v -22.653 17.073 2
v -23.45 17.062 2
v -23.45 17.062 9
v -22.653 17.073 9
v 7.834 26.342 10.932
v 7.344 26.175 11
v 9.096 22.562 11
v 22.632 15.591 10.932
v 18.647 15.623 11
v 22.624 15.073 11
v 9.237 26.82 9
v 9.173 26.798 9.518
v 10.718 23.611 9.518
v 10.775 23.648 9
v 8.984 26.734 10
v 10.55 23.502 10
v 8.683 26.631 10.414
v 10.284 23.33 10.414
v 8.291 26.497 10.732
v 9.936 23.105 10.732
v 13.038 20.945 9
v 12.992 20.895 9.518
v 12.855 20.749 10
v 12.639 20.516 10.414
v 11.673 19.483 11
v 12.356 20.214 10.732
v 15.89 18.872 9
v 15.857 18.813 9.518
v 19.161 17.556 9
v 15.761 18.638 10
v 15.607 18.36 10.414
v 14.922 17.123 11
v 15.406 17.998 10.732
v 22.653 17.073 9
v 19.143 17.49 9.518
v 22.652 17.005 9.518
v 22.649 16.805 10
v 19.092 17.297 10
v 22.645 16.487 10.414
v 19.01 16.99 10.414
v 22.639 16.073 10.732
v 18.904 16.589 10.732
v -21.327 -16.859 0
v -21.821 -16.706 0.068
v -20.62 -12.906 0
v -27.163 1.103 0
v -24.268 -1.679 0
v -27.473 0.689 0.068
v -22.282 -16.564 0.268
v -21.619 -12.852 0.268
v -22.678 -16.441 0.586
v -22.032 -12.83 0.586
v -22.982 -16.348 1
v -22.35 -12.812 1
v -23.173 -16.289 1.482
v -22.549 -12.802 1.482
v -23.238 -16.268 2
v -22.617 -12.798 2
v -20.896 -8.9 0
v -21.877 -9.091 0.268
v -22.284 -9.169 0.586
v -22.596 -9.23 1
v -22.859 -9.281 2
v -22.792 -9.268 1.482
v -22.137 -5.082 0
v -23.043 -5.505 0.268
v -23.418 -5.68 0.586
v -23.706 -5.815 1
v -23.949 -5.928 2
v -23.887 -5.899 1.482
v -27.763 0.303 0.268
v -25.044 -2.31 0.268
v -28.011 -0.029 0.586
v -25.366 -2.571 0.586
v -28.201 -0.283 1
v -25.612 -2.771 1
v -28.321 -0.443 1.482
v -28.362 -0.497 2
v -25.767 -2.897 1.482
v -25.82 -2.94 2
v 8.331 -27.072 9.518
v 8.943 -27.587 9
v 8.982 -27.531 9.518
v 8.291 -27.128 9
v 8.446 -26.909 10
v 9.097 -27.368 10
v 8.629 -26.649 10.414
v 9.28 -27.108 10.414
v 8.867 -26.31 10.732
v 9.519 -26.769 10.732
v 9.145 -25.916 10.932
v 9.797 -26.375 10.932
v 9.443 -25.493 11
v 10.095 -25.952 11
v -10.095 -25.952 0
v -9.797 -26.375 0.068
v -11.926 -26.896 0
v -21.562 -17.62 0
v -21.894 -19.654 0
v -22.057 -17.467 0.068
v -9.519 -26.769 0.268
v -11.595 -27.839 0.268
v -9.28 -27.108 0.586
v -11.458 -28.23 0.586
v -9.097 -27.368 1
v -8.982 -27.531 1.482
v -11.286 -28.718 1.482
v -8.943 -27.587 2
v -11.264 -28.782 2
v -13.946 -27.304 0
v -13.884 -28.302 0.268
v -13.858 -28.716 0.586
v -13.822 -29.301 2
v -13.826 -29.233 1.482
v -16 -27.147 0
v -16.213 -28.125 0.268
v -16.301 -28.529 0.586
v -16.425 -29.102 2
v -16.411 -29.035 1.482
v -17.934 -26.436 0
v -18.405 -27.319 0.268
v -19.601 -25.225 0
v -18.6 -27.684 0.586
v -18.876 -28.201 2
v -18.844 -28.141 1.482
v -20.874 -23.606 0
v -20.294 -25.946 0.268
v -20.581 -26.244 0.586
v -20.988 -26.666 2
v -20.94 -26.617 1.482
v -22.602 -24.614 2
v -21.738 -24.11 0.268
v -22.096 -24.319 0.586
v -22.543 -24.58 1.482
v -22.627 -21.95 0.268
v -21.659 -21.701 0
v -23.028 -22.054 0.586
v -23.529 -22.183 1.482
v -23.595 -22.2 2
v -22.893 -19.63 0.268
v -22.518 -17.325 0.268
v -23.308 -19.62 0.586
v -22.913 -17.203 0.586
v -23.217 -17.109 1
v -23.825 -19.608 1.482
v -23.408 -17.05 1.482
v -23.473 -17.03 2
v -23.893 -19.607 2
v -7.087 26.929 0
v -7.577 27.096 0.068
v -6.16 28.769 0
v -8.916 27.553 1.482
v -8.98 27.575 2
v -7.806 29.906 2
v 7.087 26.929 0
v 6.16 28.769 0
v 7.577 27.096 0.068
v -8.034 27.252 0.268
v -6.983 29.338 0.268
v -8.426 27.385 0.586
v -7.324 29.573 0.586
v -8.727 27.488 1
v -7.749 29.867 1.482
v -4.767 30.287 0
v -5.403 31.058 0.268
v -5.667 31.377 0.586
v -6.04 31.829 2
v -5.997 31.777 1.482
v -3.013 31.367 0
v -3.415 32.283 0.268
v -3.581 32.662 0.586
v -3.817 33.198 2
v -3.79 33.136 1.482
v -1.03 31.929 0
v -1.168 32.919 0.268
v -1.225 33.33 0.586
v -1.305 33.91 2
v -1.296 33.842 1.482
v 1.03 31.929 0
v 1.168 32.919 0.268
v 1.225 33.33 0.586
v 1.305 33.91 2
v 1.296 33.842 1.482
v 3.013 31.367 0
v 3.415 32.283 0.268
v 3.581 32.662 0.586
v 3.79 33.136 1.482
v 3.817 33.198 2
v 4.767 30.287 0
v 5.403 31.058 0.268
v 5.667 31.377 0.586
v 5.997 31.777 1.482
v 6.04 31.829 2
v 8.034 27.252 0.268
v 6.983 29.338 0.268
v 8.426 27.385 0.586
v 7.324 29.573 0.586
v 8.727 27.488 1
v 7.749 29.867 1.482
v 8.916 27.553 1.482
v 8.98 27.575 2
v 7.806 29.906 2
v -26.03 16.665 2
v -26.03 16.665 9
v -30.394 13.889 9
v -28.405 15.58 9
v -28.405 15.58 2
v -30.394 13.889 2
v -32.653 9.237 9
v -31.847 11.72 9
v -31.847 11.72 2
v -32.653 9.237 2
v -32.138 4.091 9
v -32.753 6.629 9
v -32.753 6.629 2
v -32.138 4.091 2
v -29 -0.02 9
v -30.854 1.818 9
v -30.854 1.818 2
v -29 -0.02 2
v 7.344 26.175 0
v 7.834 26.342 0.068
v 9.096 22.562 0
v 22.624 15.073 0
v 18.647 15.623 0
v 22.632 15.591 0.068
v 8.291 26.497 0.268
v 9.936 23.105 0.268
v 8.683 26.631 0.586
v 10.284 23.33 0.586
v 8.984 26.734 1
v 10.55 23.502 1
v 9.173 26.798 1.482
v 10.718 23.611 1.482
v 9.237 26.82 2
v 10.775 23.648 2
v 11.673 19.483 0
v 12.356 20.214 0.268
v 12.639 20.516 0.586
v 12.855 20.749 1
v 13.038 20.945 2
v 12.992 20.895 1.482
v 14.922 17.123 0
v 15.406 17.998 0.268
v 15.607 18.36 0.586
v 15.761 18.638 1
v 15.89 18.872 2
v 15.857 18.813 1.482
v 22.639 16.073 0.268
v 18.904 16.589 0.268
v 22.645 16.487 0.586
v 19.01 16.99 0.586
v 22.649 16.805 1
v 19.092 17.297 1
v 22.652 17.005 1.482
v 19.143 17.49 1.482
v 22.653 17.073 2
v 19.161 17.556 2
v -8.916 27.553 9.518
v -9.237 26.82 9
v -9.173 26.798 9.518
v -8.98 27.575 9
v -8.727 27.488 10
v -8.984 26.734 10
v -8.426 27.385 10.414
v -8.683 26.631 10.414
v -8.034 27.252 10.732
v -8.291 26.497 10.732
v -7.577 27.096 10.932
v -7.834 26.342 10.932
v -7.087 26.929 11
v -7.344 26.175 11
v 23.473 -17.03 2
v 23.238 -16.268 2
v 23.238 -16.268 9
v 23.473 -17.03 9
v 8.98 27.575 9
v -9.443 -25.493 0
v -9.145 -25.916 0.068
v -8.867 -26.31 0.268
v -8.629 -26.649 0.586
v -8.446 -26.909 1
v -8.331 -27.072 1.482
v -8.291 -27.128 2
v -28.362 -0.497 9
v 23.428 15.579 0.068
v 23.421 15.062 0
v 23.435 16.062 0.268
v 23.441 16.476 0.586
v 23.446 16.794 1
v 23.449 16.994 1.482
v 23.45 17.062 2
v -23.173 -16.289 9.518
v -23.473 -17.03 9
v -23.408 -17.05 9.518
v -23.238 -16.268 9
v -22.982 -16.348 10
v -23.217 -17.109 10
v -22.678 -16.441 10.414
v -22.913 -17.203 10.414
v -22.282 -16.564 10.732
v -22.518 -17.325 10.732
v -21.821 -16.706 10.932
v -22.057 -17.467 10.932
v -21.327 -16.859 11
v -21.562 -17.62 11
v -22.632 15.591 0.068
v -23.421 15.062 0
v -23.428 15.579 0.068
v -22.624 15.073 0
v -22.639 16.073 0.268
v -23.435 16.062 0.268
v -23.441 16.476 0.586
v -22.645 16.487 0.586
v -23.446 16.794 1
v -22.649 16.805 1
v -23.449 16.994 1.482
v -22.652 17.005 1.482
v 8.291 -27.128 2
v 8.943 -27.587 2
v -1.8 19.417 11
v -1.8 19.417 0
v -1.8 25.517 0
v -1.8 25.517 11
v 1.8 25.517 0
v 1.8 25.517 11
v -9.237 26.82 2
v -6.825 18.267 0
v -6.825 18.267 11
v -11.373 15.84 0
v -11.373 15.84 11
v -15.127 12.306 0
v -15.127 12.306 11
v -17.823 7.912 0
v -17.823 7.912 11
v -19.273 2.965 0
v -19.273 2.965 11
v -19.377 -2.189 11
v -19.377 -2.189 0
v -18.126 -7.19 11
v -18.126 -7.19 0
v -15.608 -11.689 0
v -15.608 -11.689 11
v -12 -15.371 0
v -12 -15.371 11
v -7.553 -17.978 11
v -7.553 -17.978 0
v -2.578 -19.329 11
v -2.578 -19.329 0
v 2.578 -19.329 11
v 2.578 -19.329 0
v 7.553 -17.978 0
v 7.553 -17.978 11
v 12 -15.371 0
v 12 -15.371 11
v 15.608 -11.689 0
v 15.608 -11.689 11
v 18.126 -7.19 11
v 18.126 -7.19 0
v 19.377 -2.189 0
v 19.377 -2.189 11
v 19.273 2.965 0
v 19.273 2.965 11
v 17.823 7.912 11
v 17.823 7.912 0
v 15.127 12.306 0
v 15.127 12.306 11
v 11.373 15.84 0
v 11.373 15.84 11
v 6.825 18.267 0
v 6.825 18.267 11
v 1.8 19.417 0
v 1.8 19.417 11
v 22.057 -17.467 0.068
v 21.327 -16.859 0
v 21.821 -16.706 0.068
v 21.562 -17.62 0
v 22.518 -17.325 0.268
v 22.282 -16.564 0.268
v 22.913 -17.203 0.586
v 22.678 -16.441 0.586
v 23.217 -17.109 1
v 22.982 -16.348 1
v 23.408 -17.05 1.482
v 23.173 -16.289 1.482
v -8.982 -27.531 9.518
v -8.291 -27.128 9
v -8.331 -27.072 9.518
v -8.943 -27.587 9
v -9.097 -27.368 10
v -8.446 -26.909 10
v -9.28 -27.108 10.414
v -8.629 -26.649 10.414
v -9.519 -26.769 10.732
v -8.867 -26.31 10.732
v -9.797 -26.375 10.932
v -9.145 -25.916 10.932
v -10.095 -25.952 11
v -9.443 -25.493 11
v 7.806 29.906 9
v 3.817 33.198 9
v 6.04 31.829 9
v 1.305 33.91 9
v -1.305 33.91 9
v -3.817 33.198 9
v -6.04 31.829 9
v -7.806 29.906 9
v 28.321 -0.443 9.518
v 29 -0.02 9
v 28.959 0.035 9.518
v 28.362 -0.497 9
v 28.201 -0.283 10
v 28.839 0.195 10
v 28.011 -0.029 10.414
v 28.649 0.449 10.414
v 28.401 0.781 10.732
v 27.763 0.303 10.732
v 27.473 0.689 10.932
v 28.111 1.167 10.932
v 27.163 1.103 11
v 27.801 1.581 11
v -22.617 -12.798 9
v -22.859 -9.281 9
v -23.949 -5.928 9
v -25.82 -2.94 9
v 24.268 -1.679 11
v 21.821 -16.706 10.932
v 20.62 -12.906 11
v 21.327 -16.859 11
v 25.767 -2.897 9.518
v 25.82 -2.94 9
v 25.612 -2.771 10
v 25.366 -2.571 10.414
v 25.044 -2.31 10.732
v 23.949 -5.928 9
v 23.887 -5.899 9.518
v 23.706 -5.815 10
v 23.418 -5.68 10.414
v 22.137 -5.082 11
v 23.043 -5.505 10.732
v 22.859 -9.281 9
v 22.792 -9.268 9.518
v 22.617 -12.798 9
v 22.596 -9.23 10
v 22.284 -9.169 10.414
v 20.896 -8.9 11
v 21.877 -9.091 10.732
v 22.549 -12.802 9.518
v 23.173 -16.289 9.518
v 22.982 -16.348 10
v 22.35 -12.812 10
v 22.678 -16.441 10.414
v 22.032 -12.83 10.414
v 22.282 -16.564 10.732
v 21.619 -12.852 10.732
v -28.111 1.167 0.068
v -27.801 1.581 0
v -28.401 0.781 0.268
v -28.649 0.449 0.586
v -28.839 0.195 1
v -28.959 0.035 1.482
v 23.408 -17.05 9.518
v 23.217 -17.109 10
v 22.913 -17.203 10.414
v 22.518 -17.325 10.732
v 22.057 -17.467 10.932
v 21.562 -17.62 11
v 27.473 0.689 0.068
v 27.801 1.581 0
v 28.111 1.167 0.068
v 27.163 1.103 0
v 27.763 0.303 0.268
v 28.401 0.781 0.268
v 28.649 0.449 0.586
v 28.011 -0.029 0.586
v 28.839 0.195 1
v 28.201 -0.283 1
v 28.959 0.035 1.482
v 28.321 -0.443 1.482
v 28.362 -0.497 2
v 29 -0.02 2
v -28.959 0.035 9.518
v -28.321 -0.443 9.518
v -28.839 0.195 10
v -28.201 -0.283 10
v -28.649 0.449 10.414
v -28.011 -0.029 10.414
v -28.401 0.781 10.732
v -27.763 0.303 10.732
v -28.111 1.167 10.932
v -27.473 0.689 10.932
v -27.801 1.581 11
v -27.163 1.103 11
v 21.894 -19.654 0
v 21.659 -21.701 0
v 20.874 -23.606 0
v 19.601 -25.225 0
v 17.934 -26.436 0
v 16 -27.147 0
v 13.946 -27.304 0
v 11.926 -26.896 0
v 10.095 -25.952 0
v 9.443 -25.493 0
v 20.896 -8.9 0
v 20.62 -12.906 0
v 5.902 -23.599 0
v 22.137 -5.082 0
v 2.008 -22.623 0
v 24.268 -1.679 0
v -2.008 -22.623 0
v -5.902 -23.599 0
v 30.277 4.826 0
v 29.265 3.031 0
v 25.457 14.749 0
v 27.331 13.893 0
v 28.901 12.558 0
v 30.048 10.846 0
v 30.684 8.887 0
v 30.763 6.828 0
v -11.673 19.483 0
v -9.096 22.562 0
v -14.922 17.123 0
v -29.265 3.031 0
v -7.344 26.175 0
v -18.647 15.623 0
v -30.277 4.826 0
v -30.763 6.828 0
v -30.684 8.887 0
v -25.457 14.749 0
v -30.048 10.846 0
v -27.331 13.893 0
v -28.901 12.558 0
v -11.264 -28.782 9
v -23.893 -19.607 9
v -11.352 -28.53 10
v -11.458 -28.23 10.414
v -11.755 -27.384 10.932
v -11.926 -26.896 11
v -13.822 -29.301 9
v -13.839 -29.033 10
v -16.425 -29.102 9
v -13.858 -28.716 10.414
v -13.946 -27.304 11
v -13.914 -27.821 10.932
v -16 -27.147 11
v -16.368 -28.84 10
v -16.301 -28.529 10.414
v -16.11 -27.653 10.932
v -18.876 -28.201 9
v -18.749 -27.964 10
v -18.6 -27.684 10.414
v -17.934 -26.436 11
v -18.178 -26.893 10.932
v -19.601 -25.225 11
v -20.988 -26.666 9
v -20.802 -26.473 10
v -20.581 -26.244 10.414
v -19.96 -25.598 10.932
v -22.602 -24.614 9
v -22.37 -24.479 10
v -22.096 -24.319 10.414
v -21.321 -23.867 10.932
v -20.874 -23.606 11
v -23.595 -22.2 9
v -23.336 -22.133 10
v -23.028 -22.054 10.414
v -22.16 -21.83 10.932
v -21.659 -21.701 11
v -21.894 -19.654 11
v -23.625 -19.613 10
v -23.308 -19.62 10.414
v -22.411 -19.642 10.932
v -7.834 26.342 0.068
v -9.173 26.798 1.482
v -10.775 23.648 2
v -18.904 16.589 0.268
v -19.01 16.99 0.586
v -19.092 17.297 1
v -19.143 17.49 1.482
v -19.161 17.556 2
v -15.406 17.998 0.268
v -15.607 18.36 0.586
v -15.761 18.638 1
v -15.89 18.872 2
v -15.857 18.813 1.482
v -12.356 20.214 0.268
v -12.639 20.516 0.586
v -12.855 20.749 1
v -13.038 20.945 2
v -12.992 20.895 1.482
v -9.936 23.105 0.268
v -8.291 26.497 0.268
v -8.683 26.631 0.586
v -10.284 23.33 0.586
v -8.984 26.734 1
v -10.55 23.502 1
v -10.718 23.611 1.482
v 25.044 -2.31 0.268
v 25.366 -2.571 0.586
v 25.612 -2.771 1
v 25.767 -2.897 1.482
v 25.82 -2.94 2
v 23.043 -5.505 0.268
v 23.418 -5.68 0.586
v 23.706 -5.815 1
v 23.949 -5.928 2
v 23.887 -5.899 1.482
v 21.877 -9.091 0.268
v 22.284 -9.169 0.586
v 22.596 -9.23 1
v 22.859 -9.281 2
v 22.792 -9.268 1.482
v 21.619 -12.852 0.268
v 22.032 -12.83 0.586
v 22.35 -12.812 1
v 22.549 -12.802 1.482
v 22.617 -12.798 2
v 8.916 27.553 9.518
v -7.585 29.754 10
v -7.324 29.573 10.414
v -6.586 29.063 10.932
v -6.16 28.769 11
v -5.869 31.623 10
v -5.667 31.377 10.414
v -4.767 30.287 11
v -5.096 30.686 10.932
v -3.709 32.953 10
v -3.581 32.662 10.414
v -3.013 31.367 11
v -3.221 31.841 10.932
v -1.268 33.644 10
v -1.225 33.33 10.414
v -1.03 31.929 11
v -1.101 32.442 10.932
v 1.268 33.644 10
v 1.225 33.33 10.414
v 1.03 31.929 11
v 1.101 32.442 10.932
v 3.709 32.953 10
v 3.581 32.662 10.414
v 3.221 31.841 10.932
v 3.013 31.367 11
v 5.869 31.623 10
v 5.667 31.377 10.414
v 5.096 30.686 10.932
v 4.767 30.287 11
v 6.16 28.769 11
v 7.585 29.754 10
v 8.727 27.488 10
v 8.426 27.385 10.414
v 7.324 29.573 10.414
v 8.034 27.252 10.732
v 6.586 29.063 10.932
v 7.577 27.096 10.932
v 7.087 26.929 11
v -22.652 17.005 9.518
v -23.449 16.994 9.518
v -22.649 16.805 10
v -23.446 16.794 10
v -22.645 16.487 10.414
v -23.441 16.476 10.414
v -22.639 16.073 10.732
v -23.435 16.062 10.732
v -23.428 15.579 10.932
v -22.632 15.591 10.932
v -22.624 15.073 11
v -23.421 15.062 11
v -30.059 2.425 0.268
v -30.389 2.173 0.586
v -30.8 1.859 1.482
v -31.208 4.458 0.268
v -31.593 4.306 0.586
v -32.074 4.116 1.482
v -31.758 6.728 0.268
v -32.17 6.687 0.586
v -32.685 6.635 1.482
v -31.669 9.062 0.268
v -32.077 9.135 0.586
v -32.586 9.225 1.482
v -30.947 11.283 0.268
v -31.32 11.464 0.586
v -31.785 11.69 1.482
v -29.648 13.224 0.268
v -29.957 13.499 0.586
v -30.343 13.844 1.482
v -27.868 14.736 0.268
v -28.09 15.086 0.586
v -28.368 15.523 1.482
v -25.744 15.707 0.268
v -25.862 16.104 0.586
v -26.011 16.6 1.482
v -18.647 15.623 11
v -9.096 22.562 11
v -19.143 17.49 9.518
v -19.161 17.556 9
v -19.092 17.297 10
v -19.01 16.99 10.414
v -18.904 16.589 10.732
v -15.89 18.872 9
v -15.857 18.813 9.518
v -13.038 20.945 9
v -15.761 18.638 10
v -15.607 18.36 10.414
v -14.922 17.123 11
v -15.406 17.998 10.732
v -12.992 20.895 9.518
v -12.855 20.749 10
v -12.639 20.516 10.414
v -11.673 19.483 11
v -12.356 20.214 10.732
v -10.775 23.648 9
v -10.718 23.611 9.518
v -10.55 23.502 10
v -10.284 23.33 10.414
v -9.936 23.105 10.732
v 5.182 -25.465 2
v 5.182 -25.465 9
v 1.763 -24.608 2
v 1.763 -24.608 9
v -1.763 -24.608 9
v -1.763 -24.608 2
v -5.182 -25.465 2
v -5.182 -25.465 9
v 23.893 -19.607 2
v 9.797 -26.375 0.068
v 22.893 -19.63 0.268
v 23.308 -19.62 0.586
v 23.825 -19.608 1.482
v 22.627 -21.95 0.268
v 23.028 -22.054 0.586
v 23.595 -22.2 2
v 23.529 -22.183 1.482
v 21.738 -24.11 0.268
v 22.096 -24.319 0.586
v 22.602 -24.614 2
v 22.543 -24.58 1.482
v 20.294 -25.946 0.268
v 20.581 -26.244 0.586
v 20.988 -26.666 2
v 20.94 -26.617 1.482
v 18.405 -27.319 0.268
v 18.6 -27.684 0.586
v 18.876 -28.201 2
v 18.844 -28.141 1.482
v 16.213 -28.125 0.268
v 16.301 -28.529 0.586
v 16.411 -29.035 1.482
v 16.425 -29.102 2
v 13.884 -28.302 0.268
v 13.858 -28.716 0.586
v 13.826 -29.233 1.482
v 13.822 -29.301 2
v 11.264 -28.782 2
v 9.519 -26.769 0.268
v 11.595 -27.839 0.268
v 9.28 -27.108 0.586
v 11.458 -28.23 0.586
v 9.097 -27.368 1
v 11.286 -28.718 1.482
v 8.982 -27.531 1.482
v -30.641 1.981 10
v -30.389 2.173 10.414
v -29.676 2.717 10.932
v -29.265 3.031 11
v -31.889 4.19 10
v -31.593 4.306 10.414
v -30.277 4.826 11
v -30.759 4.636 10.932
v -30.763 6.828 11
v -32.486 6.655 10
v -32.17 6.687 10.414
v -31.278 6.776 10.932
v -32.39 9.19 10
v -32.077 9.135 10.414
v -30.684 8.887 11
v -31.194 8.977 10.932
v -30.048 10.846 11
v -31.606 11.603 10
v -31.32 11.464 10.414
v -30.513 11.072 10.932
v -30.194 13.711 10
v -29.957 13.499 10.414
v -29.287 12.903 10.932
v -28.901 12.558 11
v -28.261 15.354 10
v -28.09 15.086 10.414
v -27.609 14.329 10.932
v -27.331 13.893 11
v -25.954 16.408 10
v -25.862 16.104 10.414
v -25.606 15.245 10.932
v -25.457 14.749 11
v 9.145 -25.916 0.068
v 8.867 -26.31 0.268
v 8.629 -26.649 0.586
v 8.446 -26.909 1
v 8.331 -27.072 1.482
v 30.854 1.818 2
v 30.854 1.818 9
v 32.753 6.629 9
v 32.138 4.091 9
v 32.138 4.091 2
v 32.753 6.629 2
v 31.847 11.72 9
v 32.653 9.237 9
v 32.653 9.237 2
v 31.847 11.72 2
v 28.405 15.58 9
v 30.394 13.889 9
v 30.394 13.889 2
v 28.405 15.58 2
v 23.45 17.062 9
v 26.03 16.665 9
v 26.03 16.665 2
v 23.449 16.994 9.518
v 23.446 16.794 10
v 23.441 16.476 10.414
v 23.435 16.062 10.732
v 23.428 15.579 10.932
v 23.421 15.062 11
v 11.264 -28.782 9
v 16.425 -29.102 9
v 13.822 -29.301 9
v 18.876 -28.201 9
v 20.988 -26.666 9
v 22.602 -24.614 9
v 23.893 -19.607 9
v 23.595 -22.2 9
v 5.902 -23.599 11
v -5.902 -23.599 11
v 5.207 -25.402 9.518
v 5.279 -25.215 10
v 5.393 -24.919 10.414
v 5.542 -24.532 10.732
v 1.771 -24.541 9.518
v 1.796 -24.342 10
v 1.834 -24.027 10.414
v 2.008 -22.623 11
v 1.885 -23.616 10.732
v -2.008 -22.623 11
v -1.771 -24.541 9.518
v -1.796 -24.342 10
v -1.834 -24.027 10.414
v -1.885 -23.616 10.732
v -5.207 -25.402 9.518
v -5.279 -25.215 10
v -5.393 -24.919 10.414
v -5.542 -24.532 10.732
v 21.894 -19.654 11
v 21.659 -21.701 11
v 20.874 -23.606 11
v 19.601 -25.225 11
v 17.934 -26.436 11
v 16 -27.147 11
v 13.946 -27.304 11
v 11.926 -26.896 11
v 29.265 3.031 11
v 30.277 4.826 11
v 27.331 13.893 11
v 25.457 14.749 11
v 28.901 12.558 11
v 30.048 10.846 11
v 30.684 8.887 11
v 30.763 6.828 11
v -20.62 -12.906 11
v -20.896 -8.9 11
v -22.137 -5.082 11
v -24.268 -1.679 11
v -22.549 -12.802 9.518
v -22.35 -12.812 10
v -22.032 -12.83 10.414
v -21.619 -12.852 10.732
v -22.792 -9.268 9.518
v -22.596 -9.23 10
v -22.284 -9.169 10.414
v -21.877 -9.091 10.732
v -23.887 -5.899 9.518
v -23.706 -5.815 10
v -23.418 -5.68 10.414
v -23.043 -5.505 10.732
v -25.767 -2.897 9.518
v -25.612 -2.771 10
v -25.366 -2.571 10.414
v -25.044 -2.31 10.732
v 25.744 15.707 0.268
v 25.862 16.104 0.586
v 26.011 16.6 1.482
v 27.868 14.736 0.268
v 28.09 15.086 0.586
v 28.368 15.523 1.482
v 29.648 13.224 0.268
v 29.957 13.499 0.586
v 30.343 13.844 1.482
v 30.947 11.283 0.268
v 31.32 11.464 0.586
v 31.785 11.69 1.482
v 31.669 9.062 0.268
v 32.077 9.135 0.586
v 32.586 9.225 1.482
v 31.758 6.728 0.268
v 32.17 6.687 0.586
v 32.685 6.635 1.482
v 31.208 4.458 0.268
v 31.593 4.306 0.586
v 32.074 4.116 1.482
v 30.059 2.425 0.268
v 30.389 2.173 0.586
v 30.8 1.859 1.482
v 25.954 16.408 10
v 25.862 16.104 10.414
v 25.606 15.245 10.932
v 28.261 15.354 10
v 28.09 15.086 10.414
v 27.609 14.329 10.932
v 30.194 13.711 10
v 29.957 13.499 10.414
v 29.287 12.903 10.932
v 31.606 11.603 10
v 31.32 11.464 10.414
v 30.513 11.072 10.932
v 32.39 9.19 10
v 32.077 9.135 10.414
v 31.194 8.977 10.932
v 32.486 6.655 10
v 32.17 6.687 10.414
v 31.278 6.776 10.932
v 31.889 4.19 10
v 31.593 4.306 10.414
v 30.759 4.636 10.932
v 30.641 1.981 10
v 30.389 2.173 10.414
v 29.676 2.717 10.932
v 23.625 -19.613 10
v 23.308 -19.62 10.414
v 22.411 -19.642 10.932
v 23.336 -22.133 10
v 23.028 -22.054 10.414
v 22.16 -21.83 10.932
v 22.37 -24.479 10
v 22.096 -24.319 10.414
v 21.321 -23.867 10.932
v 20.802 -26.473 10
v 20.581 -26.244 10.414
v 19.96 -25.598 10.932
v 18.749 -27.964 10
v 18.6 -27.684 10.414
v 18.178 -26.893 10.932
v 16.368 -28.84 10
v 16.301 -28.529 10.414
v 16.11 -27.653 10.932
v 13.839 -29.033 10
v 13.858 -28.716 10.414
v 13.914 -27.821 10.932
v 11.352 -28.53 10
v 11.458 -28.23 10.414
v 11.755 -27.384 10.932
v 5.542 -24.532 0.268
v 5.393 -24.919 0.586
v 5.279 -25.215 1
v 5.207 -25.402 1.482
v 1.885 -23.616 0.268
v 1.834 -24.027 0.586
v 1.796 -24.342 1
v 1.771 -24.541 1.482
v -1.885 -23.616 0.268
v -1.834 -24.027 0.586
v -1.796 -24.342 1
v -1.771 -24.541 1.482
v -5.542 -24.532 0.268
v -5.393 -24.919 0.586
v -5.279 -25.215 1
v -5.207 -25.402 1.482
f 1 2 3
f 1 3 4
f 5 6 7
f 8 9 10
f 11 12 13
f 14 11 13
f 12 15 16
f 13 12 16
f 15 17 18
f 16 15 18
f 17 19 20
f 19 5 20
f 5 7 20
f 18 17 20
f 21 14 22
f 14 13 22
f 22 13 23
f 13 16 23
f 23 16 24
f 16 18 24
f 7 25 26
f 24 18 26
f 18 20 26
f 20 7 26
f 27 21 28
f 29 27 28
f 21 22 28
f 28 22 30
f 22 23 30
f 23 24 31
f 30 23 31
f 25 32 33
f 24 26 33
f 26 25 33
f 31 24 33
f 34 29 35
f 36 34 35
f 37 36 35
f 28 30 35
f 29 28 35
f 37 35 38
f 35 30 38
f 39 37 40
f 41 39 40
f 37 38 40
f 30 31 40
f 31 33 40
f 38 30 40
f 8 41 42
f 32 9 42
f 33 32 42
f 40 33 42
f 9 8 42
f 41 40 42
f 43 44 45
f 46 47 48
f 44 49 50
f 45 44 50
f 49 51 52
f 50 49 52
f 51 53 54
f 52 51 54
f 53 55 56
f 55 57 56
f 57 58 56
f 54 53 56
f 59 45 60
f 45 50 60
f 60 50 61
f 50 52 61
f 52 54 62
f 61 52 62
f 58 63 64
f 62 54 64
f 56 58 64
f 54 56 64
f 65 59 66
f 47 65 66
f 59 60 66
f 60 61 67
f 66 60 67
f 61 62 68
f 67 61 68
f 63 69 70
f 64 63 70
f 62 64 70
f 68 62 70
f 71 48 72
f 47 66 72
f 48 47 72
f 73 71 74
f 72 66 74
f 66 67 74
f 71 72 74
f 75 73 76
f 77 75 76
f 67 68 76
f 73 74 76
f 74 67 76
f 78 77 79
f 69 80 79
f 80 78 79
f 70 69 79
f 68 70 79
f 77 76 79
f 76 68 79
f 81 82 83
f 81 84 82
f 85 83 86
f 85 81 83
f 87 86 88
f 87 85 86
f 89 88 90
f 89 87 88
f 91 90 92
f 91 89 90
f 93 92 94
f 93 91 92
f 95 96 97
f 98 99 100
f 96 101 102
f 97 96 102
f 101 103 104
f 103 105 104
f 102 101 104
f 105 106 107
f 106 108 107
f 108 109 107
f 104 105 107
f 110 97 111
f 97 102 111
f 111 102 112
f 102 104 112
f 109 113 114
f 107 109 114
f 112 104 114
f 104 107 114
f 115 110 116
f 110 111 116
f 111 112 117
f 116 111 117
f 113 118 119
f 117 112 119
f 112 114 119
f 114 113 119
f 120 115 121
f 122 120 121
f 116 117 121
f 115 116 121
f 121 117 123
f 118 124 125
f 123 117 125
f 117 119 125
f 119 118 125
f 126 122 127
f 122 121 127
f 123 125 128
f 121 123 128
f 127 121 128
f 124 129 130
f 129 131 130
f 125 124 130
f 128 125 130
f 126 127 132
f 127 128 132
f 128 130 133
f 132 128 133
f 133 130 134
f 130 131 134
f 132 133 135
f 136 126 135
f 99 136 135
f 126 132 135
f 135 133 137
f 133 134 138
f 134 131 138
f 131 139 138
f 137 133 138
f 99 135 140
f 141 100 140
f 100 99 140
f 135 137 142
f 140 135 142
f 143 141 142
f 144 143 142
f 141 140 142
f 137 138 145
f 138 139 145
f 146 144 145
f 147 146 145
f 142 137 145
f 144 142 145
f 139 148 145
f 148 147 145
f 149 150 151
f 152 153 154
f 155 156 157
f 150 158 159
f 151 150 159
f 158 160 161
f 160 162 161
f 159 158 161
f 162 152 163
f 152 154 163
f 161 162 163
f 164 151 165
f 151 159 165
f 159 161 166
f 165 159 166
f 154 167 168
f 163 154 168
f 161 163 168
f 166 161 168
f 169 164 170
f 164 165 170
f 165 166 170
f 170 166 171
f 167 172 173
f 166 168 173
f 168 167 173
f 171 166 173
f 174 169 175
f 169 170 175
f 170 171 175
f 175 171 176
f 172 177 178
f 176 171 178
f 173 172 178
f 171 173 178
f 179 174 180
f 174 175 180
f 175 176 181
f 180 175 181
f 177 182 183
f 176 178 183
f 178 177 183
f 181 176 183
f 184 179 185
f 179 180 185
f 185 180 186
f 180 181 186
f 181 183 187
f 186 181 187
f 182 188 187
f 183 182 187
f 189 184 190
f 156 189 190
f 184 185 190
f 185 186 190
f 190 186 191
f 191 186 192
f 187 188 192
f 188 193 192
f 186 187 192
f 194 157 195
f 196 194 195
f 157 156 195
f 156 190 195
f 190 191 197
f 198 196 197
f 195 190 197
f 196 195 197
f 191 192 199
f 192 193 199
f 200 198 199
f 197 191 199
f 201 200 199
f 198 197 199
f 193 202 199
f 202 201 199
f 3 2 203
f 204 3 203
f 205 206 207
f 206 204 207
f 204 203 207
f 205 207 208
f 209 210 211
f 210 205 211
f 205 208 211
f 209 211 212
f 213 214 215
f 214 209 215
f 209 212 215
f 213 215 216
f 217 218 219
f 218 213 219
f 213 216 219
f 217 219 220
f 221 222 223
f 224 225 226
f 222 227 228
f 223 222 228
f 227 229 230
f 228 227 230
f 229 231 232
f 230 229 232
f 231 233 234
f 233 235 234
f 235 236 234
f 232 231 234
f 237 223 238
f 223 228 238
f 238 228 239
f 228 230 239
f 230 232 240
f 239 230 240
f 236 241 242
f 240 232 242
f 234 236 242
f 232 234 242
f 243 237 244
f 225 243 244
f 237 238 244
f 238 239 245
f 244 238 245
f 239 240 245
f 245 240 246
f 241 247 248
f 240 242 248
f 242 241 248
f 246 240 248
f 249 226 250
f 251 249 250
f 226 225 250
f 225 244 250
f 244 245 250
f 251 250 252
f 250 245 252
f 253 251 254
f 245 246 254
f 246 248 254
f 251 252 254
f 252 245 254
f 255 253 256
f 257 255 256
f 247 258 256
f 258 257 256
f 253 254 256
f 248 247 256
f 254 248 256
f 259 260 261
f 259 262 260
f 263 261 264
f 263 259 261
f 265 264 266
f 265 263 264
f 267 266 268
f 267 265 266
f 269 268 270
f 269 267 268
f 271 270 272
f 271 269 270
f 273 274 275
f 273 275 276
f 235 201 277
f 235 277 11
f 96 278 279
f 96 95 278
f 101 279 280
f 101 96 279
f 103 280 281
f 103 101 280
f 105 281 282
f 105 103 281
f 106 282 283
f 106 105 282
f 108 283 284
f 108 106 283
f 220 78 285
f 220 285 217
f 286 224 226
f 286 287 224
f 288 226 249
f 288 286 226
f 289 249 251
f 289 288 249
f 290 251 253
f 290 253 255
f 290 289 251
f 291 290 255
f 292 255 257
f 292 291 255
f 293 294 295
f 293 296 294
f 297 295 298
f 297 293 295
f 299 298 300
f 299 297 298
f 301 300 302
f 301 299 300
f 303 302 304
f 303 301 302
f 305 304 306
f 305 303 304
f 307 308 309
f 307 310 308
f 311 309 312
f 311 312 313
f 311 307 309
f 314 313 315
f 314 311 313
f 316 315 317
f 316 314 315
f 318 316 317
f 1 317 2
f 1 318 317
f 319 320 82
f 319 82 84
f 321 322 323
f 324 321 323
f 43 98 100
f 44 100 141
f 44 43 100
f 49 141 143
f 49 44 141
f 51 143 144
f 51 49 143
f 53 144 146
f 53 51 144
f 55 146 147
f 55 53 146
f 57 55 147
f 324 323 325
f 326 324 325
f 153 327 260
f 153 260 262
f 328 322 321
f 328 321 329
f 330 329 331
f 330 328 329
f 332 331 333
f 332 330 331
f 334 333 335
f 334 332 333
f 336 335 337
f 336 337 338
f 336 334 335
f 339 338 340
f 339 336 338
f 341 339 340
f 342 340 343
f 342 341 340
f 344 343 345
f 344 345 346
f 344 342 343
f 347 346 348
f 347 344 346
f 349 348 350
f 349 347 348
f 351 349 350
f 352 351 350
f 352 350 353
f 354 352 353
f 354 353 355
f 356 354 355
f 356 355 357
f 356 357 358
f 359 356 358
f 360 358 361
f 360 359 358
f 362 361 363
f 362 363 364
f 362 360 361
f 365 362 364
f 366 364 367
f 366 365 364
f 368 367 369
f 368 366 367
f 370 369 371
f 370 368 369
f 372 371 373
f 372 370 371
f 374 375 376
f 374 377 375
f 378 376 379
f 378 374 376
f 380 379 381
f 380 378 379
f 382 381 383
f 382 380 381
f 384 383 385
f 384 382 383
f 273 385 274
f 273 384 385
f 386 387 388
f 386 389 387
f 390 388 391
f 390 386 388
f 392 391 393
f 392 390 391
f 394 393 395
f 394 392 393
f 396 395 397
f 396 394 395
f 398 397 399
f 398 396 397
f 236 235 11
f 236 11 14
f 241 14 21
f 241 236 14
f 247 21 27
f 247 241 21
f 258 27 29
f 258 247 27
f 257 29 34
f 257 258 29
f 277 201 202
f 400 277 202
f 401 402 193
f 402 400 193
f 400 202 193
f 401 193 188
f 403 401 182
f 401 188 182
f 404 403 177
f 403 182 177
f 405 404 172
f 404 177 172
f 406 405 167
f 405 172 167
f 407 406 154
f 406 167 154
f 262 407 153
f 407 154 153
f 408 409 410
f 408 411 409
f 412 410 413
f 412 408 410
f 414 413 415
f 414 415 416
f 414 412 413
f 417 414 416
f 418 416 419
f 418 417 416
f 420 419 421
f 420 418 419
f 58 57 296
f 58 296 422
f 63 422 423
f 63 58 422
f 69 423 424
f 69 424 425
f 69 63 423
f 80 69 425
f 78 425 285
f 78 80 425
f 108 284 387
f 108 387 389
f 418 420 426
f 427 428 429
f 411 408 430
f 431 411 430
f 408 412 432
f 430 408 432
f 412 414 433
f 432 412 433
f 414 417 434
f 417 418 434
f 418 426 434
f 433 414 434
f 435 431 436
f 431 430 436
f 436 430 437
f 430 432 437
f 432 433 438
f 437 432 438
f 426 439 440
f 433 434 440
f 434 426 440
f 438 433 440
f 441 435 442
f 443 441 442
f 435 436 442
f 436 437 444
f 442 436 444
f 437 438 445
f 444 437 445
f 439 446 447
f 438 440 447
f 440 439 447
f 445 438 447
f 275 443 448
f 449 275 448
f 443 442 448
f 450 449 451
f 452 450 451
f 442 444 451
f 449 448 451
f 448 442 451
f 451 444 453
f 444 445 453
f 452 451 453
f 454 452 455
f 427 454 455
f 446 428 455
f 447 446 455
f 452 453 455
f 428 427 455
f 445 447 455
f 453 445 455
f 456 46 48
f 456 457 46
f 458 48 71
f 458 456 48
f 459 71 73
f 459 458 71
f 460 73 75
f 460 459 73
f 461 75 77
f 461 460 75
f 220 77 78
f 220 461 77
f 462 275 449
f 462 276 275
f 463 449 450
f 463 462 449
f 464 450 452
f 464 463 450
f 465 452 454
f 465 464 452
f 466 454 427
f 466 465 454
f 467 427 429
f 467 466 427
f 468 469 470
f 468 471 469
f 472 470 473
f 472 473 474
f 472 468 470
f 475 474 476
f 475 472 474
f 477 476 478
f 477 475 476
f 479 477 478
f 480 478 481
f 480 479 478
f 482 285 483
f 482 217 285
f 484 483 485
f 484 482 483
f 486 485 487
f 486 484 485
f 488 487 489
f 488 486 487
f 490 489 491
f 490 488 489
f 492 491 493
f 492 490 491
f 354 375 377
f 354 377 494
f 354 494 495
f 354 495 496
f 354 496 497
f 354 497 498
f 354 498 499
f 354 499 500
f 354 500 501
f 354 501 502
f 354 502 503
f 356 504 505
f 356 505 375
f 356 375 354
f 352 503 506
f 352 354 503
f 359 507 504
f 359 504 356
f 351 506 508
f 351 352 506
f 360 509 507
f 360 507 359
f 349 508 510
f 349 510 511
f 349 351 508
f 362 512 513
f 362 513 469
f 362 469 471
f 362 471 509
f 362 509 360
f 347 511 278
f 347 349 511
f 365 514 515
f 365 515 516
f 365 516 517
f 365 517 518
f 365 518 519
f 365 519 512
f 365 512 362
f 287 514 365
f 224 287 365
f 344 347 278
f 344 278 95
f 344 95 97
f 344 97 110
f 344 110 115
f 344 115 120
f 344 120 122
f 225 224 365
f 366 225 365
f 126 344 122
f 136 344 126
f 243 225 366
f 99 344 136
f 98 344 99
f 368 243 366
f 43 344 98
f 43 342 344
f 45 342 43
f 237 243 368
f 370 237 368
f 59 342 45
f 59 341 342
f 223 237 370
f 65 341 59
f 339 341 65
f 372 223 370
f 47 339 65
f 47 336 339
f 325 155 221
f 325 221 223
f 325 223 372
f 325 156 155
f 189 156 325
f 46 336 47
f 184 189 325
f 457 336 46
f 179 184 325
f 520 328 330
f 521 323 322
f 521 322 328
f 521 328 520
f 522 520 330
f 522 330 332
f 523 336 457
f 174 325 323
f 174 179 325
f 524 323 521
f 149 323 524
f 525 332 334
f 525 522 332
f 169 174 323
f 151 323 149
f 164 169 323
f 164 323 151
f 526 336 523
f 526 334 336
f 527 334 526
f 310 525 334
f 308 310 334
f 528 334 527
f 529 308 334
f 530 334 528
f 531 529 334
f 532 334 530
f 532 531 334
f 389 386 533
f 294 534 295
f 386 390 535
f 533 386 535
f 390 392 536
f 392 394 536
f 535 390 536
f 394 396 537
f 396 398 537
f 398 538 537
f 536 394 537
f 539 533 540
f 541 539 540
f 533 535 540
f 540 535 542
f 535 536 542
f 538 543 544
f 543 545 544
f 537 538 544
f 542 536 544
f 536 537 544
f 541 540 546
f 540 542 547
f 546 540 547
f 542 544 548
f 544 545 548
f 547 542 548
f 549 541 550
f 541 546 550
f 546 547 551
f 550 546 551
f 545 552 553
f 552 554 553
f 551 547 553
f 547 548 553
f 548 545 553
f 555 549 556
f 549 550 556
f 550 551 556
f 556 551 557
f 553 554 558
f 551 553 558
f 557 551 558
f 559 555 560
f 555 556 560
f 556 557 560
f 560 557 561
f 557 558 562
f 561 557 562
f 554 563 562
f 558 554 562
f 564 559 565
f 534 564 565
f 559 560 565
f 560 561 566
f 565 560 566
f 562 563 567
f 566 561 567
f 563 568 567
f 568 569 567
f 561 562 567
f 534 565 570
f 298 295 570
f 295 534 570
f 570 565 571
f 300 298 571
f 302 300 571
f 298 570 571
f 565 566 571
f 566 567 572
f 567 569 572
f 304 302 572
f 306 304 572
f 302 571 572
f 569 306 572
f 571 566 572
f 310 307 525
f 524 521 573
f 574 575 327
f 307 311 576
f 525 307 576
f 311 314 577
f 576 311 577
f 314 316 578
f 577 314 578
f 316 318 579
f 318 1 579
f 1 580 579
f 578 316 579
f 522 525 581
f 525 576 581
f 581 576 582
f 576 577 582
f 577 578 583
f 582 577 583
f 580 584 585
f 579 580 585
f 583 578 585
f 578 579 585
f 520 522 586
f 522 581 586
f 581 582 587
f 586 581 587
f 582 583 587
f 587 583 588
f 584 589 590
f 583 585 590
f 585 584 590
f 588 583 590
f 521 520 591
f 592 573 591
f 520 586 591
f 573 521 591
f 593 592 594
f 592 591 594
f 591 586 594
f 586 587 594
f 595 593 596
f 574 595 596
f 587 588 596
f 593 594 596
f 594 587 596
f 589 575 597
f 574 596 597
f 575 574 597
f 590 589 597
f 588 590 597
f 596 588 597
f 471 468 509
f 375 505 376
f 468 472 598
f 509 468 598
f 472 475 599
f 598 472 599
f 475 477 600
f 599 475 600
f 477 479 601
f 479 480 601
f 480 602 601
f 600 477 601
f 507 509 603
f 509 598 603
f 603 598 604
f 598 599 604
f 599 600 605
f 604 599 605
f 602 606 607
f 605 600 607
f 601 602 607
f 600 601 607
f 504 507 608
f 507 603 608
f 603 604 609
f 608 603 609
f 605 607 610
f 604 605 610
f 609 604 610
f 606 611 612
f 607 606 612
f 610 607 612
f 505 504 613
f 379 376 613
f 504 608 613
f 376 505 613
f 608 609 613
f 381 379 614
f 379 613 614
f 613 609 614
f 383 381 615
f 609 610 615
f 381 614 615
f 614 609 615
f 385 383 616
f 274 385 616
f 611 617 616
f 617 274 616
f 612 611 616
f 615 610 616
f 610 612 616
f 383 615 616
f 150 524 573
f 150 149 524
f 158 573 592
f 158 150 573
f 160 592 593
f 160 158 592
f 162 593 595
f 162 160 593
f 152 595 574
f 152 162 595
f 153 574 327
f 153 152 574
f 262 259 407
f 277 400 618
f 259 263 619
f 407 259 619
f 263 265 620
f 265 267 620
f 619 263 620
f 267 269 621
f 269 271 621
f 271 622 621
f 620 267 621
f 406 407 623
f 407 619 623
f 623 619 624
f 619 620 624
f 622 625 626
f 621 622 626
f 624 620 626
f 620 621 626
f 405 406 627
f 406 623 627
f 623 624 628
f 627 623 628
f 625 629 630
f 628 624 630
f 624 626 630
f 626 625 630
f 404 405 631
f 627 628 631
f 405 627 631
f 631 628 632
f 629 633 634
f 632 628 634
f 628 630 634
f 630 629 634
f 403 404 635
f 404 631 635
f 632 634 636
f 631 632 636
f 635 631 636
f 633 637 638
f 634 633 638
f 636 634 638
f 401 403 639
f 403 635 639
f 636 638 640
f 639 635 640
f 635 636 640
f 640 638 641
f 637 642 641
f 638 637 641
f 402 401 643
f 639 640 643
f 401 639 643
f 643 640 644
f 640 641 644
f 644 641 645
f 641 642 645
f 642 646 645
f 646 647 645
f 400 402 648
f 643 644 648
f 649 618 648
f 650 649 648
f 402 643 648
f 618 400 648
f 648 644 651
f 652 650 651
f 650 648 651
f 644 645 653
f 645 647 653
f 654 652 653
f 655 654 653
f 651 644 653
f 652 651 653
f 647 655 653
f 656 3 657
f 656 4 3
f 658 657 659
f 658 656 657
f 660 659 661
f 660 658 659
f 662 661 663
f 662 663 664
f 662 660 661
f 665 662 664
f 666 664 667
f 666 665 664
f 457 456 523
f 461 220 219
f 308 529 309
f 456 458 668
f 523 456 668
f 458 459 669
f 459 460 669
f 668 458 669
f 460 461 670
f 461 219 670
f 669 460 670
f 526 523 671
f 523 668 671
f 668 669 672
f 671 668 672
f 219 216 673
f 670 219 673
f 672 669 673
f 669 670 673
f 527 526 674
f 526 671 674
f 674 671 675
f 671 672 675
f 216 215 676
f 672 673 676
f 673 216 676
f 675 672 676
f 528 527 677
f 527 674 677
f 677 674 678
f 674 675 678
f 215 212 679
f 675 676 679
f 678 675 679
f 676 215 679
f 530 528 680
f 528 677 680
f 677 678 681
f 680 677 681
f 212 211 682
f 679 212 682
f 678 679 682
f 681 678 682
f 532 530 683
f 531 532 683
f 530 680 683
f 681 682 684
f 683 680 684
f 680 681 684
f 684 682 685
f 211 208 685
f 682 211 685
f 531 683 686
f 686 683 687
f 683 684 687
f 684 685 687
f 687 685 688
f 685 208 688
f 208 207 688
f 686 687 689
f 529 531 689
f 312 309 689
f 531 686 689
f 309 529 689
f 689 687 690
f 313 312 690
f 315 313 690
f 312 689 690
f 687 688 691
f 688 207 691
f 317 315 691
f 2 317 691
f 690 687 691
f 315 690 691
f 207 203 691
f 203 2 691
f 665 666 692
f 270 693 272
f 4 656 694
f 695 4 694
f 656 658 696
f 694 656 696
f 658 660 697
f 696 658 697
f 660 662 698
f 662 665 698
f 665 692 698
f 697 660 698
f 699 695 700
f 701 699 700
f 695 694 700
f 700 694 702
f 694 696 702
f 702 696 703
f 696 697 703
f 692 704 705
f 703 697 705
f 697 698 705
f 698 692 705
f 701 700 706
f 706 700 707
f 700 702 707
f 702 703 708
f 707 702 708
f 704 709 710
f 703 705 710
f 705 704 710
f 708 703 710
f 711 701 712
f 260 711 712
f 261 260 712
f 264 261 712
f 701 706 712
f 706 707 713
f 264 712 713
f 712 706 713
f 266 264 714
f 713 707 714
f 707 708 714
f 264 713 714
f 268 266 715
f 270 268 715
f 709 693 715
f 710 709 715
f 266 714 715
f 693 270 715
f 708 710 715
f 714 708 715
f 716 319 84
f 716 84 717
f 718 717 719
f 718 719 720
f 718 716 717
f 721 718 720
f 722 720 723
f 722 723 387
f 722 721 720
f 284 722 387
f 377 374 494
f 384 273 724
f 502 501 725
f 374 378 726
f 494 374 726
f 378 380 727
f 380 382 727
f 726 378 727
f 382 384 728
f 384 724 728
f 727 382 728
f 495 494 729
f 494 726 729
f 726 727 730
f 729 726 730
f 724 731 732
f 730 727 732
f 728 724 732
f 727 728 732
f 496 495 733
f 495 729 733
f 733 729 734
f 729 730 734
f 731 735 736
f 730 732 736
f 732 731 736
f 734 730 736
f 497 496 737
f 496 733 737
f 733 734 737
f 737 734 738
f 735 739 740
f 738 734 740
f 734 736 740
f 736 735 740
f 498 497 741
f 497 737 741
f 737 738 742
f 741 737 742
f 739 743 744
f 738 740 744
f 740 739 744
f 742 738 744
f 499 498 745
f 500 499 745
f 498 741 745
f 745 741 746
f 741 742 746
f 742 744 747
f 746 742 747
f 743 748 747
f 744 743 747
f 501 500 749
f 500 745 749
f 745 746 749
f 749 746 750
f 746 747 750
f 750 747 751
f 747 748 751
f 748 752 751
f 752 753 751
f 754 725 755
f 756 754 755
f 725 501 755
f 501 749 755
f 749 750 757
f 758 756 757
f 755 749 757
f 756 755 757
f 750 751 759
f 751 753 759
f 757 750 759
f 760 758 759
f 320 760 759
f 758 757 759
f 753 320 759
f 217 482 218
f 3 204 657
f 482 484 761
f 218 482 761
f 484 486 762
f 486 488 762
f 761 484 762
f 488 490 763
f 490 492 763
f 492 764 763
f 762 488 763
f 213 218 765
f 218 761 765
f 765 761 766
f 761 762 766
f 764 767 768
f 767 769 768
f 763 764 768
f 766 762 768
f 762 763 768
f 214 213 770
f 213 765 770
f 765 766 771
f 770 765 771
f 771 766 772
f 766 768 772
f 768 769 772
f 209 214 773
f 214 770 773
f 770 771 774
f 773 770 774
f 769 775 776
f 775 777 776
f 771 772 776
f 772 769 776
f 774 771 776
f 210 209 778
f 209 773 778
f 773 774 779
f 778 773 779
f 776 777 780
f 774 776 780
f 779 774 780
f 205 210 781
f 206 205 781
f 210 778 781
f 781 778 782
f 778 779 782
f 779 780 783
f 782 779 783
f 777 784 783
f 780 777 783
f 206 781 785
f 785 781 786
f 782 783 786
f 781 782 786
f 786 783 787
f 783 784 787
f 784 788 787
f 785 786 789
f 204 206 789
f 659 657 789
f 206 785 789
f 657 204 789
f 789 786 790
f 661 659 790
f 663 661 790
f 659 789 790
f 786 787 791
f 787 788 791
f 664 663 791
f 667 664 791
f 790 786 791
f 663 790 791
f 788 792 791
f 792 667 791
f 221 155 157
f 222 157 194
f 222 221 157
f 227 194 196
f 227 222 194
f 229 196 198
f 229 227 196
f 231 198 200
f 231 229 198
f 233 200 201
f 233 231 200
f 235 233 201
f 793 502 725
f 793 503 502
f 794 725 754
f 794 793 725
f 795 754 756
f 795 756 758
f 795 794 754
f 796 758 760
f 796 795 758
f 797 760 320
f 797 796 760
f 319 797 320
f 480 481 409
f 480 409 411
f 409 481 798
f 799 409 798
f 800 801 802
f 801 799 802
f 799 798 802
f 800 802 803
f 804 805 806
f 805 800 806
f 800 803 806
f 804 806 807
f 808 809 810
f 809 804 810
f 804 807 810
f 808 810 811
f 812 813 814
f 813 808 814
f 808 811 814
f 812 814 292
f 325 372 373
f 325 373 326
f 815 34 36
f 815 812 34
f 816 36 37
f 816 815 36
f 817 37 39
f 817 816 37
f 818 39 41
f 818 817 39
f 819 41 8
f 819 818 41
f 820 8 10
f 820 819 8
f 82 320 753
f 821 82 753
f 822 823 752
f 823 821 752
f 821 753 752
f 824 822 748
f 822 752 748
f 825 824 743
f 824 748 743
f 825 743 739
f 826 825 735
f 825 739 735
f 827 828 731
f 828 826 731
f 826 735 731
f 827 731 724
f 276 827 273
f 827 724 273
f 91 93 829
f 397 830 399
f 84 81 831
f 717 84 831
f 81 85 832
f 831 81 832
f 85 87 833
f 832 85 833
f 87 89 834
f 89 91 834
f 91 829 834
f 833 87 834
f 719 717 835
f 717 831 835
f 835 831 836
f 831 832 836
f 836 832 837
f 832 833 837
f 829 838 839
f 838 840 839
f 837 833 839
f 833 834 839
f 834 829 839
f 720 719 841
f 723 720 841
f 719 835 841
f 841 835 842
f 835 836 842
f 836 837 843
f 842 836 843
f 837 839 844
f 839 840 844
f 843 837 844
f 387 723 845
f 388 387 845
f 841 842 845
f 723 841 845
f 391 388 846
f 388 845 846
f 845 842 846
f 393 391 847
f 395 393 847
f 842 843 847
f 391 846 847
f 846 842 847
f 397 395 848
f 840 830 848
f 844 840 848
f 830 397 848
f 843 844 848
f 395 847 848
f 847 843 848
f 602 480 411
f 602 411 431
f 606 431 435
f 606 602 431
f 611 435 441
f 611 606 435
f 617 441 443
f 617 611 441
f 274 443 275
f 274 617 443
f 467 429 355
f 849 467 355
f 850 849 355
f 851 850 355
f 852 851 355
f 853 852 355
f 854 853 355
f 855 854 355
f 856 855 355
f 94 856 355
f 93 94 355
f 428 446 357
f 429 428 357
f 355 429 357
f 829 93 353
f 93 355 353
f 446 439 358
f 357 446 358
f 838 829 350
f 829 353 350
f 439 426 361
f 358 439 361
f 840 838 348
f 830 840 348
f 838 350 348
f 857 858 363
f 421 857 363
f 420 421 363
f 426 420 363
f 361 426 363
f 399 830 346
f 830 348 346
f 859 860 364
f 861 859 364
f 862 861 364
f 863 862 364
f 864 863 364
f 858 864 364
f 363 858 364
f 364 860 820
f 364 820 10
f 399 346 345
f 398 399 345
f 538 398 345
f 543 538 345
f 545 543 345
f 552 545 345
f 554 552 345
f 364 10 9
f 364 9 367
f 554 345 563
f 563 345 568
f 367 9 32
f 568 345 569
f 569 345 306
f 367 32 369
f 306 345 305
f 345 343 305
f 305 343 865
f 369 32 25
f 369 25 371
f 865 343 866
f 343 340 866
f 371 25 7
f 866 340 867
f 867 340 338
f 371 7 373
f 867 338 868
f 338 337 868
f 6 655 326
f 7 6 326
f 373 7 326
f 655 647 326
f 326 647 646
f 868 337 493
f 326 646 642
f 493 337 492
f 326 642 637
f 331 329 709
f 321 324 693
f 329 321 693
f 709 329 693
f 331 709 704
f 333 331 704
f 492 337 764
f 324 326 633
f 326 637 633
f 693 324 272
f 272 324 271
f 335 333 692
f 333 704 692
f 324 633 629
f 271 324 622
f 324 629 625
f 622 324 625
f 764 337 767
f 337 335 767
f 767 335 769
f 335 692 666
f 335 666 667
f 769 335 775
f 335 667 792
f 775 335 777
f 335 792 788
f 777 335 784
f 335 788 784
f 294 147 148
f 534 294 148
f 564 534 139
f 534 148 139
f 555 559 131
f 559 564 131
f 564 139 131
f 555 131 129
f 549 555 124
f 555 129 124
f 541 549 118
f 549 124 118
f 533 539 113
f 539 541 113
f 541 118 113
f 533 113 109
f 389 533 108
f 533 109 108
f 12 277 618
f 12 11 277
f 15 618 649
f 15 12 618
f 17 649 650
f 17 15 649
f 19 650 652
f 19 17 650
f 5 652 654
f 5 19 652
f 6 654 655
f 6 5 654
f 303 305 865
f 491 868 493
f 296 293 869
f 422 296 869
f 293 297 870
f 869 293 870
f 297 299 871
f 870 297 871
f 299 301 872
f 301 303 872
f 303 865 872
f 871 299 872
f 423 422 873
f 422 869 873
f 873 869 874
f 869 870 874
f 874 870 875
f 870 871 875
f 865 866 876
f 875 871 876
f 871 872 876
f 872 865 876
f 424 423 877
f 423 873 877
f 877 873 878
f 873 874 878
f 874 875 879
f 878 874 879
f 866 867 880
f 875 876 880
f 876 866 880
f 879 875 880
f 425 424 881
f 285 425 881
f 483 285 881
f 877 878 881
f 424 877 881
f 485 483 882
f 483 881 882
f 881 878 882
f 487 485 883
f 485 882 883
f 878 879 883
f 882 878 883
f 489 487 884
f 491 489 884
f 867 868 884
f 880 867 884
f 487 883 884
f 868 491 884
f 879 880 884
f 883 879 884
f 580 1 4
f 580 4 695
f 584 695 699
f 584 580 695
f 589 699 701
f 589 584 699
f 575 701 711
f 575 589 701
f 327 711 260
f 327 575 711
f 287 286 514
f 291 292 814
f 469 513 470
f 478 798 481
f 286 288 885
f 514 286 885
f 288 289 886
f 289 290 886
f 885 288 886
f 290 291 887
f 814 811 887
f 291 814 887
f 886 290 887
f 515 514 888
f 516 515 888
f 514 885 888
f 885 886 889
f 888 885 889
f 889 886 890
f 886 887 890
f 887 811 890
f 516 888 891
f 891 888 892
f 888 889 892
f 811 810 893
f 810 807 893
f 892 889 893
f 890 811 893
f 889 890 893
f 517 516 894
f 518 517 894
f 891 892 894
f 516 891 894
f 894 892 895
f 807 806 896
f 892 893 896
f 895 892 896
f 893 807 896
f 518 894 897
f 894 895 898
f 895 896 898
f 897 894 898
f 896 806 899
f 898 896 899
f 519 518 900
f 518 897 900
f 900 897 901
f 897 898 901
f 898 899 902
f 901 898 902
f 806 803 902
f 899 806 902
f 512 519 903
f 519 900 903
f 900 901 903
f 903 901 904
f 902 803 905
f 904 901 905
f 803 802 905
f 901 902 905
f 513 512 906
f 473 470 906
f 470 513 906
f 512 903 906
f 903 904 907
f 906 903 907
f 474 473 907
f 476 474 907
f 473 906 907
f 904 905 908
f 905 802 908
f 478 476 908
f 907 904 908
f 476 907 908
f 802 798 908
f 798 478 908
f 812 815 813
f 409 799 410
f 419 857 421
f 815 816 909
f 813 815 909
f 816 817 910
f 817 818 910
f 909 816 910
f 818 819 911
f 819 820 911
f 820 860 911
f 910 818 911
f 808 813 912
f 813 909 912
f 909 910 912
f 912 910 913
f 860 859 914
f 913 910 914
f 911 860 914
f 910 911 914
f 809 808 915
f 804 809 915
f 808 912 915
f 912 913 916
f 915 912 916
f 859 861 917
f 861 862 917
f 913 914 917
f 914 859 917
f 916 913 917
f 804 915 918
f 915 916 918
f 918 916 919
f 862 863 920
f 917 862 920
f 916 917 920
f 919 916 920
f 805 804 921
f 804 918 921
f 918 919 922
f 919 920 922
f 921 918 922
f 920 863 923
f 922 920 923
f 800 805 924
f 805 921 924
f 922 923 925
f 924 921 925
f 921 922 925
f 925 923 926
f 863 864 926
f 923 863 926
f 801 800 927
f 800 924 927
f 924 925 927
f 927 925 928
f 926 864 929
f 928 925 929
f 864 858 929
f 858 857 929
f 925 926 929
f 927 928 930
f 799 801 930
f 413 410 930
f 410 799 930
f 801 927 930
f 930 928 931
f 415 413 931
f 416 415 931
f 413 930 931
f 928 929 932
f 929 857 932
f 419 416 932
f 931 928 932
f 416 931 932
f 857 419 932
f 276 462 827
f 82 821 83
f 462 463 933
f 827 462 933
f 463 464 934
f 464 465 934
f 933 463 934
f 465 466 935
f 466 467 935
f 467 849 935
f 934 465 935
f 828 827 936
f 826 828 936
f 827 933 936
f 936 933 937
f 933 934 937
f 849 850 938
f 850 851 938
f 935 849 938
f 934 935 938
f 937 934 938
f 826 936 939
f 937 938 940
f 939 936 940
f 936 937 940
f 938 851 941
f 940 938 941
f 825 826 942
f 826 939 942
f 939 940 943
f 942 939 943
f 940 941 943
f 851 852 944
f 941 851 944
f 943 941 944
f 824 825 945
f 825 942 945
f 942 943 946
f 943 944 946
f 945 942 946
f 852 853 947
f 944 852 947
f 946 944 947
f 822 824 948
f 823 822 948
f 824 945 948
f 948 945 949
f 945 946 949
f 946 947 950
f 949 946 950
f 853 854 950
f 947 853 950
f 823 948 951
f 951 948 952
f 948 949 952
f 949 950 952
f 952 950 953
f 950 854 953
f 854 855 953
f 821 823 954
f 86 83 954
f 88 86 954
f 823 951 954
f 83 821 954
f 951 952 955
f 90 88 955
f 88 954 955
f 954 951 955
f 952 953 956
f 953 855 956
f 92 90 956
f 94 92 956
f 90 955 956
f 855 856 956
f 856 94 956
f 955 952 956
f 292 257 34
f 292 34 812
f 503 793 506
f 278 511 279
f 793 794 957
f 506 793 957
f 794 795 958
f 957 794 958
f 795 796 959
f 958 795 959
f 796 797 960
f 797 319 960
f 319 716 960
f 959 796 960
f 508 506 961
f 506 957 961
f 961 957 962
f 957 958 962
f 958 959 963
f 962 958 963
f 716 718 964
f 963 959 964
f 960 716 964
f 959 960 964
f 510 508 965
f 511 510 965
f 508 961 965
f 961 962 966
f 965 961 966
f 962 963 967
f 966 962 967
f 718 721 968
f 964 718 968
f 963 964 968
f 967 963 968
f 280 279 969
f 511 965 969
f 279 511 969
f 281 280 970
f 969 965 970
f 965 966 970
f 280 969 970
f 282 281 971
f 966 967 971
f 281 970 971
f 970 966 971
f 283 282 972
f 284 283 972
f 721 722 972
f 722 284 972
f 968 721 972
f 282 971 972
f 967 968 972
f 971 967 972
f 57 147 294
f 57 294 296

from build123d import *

# Parameters (mm, degrees)
PAD_DEPTH   = 11
FILLET_R    = 2
FILLET001_R = 2


with BuildPart() as part:
    # Sketch → Pad (new body)
    with BuildSketch(Plane.XY):
        with BuildLine():
            Line((8.980158, 27.574567), (9.237406, 26.820266))
            ThreePointArc((9.237406, 26.820266), (14.400739, 19.820916), (22.653073, 17.073213))
            Line((22.653073, 17.073213), (23.44995, 17.061648))
            ThreePointArc((28.999993, -0.019628), (32.335922, 10.506578), (23.44995, 17.061648))
            Line((28.999993, -0.019628), (28.362104, -0.497377))
            ThreePointArc((28.362104, -0.497377), (23.300885, -7.570916), (23.237775, -16.26844))
            Line((23.237775, -16.26844), (23.473025, -17.029889))
            ThreePointArc((8.942823, -27.586698), (19.984699, -27.506578), (23.473025, -17.029889))
            Line((8.942823, -27.586698), (8.291338, -27.127662))
            ThreePointArc((8.291338, -27.127662), (0, -24.5), (-8.291338, -27.127662))
            Line((-8.291338, -27.127662), (-8.942823, -27.586698))
            ThreePointArc((-23.473025, -17.029889), (-19.984699, -27.506578), (-8.942823, -27.586698))
            Line((-23.473025, -17.029889), (-23.237775, -16.26844))
            ThreePointArc((-23.237775, -16.26844), (-23.300885, -7.570916), (-28.362104, -0.497377))
            Line((-28.362104, -0.497377), (-28.999993, -0.019628))
            ThreePointArc((-23.44995, 17.061648), (-32.335922, 10.506578), (-28.999993, -0.019628))
            Line((-23.44995, 17.061648), (-22.653073, 17.073213))
            ThreePointArc((-22.653073, 17.073213), (-14.400739, 19.820916), (-9.237406, 26.820266))
            Line((-9.237406, 26.820266), (-8.980158, 27.574567))
            ThreePointArc((8.980158, 27.574567), (0, 34), (-8.980158, 27.574567))
        make_face()
        with BuildLine():
            ThreePointArc((-1.8, 19.416745), (0, -19.5), (1.8, 19.416745))
            Line((1.8, 19.416745), (1.8, 25.516745))
            Line((-1.8, 25.516745), (1.8, 25.516745))
            Line((-1.8, 19.416745), (-1.8, 25.516745))
        make_face(mode=Mode.SUBTRACT)
    extrude(amount=PAD_DEPTH)

    # Fillet
    fillet_edges = [part.edges().sort_by_distance(p)[0] for p in [
        (23.300885, -7.570916, 11),
    ]]
    fillet(fillet_edges, radius=FILLET_R)

    # Fillet001
    fillet001_edges = [part.edges().sort_by_distance(p)[0] for p in [
        (23.300885, -7.570916, 0),
    ]]
    fillet(fillet001_edges, radius=FILLET001_R)


solid = part.part
